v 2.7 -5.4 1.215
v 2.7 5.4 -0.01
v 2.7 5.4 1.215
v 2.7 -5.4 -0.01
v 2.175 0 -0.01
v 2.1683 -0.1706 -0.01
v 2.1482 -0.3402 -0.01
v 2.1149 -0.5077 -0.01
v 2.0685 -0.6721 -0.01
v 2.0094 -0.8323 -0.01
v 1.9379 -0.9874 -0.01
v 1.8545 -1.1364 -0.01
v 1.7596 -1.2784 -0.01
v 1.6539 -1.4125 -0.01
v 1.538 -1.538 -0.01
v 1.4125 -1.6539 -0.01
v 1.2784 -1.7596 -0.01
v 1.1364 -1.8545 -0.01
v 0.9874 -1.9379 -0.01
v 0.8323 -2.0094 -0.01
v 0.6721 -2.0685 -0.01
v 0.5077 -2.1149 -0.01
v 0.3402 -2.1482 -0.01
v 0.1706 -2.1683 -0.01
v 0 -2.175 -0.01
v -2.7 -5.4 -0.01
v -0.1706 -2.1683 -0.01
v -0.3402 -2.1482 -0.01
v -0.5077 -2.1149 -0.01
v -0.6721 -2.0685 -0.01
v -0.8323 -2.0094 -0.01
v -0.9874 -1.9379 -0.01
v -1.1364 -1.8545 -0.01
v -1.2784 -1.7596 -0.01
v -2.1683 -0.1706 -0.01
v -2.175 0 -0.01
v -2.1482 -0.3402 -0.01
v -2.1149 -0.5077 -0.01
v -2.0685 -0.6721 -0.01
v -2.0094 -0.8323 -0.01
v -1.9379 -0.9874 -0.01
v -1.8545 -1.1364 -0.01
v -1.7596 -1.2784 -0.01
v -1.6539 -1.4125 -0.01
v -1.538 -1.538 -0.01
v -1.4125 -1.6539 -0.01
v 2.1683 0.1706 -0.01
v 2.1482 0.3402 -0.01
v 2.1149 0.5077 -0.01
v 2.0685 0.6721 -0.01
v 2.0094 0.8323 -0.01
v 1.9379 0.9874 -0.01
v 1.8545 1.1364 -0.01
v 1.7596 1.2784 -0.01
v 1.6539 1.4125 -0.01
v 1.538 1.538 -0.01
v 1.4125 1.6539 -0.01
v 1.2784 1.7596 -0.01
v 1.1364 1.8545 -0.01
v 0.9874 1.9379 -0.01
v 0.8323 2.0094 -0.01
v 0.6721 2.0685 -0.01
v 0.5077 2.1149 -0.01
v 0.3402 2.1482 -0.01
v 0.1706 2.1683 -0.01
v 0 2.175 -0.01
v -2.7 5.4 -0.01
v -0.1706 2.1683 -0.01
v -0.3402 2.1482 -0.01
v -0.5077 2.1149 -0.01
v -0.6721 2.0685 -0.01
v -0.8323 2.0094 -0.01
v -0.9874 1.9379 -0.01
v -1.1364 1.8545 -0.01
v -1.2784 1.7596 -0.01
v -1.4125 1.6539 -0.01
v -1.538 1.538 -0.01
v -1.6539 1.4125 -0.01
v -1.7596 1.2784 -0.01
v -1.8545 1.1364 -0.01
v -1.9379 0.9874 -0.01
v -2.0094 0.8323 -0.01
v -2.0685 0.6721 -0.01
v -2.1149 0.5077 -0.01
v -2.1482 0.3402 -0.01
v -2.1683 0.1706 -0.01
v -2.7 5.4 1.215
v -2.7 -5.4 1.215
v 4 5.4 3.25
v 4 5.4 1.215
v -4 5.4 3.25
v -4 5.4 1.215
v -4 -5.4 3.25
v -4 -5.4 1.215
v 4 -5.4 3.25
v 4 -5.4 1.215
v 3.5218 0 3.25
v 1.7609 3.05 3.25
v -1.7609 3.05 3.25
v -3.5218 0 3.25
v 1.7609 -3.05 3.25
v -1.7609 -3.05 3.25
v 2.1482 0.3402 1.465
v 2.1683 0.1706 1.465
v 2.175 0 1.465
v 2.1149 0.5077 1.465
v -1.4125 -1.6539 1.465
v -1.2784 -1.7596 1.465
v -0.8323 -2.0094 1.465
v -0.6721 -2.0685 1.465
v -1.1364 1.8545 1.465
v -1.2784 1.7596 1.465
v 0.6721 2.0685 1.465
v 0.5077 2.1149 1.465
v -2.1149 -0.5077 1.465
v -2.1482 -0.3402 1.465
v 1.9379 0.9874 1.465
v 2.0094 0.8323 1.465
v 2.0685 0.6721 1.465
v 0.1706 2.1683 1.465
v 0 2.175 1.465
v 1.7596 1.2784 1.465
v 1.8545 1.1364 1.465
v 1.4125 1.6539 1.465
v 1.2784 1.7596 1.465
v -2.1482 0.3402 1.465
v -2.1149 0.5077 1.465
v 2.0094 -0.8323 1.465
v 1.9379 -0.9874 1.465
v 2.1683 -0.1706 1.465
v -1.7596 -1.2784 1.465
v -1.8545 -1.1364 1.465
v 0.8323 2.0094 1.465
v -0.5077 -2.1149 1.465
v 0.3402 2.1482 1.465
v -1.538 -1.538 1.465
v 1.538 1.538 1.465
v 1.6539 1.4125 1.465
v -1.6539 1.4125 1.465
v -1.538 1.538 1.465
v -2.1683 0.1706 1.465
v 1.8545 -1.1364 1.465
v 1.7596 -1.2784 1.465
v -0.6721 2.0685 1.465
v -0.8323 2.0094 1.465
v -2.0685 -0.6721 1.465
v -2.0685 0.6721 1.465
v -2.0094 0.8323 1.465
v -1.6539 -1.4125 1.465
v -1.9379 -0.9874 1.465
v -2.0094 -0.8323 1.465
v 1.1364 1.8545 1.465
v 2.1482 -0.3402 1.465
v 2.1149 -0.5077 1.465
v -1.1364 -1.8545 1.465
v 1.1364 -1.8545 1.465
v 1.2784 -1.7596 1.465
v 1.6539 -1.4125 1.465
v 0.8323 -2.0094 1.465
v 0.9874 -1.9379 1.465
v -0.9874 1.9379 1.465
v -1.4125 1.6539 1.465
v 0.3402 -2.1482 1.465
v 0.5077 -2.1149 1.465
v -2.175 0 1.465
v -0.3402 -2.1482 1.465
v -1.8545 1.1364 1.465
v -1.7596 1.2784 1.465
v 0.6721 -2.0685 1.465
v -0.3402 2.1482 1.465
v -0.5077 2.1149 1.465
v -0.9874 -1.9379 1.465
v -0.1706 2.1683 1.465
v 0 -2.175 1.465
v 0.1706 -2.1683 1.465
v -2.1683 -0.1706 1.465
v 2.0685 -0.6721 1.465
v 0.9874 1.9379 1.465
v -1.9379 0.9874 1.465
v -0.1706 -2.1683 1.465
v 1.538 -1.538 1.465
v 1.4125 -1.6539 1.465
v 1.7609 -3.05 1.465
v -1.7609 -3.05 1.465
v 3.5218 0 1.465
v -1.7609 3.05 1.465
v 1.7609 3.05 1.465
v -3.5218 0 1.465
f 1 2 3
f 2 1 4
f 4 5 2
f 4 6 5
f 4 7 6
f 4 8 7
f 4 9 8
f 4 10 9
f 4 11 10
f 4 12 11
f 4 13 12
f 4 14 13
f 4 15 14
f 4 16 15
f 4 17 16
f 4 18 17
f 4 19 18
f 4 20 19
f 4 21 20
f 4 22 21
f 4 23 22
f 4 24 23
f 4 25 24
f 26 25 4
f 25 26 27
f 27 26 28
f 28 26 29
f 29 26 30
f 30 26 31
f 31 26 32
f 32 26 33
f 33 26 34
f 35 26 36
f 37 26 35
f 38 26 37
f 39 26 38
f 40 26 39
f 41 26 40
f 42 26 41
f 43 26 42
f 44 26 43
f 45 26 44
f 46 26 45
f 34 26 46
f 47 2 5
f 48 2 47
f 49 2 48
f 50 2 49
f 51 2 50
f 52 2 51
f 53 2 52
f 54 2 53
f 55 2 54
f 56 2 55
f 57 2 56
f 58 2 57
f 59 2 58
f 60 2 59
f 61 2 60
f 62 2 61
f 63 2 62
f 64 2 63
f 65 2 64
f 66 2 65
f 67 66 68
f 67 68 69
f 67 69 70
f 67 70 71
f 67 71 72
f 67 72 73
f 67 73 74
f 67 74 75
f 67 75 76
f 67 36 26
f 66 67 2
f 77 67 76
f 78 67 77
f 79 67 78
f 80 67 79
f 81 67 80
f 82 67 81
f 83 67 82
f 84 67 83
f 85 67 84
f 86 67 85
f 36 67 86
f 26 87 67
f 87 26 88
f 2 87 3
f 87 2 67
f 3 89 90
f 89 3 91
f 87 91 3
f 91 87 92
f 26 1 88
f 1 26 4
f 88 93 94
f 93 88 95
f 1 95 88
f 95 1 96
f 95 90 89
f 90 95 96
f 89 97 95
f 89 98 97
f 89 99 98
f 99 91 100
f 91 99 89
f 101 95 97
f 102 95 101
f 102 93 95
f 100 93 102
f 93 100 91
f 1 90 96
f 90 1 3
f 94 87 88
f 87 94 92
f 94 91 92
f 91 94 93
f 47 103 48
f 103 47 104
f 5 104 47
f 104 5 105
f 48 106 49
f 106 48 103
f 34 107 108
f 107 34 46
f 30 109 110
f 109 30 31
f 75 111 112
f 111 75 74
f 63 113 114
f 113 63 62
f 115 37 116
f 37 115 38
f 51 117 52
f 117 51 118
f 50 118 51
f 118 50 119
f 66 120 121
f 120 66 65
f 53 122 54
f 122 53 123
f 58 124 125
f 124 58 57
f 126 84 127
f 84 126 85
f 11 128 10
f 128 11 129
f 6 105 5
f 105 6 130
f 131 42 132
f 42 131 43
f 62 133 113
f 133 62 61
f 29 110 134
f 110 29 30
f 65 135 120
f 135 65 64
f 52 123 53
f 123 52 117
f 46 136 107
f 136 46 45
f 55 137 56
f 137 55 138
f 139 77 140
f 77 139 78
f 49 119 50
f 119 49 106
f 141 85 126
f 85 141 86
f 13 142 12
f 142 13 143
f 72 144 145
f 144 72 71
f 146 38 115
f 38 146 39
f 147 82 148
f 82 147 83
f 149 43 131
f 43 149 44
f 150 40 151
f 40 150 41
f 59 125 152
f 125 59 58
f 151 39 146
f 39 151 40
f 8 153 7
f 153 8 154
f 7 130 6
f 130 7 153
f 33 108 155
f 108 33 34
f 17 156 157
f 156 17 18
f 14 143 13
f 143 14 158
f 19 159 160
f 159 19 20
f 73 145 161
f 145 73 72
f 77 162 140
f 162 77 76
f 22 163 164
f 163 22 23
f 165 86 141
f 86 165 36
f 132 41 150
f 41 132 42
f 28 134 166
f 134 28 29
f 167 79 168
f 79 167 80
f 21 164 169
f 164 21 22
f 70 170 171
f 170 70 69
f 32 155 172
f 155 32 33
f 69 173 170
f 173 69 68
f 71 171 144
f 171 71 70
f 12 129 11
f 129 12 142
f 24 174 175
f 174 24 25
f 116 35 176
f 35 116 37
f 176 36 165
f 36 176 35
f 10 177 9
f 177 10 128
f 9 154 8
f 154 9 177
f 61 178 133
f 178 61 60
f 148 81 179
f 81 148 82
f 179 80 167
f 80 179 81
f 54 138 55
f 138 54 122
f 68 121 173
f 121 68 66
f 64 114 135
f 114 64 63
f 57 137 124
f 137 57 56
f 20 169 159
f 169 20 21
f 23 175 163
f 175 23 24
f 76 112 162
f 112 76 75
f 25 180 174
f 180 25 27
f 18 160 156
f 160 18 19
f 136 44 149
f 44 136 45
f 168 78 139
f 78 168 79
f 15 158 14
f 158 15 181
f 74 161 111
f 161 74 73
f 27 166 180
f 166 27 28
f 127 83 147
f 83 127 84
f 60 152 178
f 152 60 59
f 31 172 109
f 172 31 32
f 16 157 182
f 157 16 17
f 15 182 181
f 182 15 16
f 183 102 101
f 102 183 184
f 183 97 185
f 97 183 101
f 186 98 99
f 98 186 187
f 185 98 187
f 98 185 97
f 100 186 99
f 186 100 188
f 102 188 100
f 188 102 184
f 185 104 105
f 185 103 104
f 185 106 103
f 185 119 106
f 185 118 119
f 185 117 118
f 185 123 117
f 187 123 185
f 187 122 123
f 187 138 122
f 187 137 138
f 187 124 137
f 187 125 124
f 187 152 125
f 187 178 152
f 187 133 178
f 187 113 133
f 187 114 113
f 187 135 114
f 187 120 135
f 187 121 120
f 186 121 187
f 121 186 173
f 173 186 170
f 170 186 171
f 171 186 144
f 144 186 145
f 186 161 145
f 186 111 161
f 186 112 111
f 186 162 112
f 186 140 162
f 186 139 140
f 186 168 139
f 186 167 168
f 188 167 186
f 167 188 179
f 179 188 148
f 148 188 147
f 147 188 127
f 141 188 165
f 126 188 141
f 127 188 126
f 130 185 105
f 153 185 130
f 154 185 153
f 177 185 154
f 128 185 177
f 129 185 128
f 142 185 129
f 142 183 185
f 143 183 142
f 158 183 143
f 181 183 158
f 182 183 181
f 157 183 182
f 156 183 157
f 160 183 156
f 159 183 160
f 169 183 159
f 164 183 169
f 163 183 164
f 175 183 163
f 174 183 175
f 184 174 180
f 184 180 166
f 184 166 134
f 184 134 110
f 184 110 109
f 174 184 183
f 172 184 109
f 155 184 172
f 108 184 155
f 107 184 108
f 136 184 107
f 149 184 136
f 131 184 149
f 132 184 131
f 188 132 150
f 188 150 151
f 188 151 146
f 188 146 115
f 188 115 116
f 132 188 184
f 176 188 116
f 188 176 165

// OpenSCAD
$fn = 80;

// Target specs (mm)
screw_d      = 4.0;   // for 4.0mm screw (clearance hole used)
across_flats = 6.0;   // hex across flats (wrench size)
thickness    = 3.25;  // overall thickness (Z)

// Clearances (mm)
hole_clearance = 0.35;
hex_clearance  = 0.10;

// T-slot nut geometry (simple, typical profile)
// Z split: head + neck = thickness
head_h = thickness * 0.62;
neck_h = thickness - head_h;

// Planform sizes (X = slot width direction, Y = along slot)
head_w = across_flats + 2.0;   // wider head to catch slot lips
neck_w = across_flats - 0.6;   // narrower neck to slide in slot
nut_len = max(10.0, across_flats * 1.8);

// Small overlap to guarantee watertight unions/differences
eps = 0.02;

module hex_prism_across_flats(af, h, center=false) {
    // across_flats = sqrt(3) * R  (R = circumradius)
    R = af / sqrt(3);
    cylinder(h = h, r = R, $fn = 6, center = center);
}

module tslot_nut_body() {
    union() {
        // Neck (bottom)
        translate([0, 0, neck_h/2])
            cube([neck_w, nut_len, neck_h + eps], center = true);

        // Head (top), connected to neck with slight overlap
        translate([0, 0, neck_h + head_h/2 - eps/2])
            cube([head_w, nut_len, head_h + eps], center = true);
    }
}

difference() {
    tslot_nut_body();

    // Through clearance hole for M4 screw
    translate([0, 0, thickness/2])
        cylinder(h = thickness + 2*eps, d = screw_d + hole_clearance, center = true);

    // Hex socket (wrench size = across_flats) from TOP face down
    // Depth chosen to be clearly visible while keeping a solid bottom web.
    hex_depth = min(head_h - 0.25, thickness - 0.6);
    translate([0, 0, thickness - hex_depth/2])
        hex_prism_across_flats(across_flats + hex_clearance, hex_depth + 2*eps, center = true);
}
